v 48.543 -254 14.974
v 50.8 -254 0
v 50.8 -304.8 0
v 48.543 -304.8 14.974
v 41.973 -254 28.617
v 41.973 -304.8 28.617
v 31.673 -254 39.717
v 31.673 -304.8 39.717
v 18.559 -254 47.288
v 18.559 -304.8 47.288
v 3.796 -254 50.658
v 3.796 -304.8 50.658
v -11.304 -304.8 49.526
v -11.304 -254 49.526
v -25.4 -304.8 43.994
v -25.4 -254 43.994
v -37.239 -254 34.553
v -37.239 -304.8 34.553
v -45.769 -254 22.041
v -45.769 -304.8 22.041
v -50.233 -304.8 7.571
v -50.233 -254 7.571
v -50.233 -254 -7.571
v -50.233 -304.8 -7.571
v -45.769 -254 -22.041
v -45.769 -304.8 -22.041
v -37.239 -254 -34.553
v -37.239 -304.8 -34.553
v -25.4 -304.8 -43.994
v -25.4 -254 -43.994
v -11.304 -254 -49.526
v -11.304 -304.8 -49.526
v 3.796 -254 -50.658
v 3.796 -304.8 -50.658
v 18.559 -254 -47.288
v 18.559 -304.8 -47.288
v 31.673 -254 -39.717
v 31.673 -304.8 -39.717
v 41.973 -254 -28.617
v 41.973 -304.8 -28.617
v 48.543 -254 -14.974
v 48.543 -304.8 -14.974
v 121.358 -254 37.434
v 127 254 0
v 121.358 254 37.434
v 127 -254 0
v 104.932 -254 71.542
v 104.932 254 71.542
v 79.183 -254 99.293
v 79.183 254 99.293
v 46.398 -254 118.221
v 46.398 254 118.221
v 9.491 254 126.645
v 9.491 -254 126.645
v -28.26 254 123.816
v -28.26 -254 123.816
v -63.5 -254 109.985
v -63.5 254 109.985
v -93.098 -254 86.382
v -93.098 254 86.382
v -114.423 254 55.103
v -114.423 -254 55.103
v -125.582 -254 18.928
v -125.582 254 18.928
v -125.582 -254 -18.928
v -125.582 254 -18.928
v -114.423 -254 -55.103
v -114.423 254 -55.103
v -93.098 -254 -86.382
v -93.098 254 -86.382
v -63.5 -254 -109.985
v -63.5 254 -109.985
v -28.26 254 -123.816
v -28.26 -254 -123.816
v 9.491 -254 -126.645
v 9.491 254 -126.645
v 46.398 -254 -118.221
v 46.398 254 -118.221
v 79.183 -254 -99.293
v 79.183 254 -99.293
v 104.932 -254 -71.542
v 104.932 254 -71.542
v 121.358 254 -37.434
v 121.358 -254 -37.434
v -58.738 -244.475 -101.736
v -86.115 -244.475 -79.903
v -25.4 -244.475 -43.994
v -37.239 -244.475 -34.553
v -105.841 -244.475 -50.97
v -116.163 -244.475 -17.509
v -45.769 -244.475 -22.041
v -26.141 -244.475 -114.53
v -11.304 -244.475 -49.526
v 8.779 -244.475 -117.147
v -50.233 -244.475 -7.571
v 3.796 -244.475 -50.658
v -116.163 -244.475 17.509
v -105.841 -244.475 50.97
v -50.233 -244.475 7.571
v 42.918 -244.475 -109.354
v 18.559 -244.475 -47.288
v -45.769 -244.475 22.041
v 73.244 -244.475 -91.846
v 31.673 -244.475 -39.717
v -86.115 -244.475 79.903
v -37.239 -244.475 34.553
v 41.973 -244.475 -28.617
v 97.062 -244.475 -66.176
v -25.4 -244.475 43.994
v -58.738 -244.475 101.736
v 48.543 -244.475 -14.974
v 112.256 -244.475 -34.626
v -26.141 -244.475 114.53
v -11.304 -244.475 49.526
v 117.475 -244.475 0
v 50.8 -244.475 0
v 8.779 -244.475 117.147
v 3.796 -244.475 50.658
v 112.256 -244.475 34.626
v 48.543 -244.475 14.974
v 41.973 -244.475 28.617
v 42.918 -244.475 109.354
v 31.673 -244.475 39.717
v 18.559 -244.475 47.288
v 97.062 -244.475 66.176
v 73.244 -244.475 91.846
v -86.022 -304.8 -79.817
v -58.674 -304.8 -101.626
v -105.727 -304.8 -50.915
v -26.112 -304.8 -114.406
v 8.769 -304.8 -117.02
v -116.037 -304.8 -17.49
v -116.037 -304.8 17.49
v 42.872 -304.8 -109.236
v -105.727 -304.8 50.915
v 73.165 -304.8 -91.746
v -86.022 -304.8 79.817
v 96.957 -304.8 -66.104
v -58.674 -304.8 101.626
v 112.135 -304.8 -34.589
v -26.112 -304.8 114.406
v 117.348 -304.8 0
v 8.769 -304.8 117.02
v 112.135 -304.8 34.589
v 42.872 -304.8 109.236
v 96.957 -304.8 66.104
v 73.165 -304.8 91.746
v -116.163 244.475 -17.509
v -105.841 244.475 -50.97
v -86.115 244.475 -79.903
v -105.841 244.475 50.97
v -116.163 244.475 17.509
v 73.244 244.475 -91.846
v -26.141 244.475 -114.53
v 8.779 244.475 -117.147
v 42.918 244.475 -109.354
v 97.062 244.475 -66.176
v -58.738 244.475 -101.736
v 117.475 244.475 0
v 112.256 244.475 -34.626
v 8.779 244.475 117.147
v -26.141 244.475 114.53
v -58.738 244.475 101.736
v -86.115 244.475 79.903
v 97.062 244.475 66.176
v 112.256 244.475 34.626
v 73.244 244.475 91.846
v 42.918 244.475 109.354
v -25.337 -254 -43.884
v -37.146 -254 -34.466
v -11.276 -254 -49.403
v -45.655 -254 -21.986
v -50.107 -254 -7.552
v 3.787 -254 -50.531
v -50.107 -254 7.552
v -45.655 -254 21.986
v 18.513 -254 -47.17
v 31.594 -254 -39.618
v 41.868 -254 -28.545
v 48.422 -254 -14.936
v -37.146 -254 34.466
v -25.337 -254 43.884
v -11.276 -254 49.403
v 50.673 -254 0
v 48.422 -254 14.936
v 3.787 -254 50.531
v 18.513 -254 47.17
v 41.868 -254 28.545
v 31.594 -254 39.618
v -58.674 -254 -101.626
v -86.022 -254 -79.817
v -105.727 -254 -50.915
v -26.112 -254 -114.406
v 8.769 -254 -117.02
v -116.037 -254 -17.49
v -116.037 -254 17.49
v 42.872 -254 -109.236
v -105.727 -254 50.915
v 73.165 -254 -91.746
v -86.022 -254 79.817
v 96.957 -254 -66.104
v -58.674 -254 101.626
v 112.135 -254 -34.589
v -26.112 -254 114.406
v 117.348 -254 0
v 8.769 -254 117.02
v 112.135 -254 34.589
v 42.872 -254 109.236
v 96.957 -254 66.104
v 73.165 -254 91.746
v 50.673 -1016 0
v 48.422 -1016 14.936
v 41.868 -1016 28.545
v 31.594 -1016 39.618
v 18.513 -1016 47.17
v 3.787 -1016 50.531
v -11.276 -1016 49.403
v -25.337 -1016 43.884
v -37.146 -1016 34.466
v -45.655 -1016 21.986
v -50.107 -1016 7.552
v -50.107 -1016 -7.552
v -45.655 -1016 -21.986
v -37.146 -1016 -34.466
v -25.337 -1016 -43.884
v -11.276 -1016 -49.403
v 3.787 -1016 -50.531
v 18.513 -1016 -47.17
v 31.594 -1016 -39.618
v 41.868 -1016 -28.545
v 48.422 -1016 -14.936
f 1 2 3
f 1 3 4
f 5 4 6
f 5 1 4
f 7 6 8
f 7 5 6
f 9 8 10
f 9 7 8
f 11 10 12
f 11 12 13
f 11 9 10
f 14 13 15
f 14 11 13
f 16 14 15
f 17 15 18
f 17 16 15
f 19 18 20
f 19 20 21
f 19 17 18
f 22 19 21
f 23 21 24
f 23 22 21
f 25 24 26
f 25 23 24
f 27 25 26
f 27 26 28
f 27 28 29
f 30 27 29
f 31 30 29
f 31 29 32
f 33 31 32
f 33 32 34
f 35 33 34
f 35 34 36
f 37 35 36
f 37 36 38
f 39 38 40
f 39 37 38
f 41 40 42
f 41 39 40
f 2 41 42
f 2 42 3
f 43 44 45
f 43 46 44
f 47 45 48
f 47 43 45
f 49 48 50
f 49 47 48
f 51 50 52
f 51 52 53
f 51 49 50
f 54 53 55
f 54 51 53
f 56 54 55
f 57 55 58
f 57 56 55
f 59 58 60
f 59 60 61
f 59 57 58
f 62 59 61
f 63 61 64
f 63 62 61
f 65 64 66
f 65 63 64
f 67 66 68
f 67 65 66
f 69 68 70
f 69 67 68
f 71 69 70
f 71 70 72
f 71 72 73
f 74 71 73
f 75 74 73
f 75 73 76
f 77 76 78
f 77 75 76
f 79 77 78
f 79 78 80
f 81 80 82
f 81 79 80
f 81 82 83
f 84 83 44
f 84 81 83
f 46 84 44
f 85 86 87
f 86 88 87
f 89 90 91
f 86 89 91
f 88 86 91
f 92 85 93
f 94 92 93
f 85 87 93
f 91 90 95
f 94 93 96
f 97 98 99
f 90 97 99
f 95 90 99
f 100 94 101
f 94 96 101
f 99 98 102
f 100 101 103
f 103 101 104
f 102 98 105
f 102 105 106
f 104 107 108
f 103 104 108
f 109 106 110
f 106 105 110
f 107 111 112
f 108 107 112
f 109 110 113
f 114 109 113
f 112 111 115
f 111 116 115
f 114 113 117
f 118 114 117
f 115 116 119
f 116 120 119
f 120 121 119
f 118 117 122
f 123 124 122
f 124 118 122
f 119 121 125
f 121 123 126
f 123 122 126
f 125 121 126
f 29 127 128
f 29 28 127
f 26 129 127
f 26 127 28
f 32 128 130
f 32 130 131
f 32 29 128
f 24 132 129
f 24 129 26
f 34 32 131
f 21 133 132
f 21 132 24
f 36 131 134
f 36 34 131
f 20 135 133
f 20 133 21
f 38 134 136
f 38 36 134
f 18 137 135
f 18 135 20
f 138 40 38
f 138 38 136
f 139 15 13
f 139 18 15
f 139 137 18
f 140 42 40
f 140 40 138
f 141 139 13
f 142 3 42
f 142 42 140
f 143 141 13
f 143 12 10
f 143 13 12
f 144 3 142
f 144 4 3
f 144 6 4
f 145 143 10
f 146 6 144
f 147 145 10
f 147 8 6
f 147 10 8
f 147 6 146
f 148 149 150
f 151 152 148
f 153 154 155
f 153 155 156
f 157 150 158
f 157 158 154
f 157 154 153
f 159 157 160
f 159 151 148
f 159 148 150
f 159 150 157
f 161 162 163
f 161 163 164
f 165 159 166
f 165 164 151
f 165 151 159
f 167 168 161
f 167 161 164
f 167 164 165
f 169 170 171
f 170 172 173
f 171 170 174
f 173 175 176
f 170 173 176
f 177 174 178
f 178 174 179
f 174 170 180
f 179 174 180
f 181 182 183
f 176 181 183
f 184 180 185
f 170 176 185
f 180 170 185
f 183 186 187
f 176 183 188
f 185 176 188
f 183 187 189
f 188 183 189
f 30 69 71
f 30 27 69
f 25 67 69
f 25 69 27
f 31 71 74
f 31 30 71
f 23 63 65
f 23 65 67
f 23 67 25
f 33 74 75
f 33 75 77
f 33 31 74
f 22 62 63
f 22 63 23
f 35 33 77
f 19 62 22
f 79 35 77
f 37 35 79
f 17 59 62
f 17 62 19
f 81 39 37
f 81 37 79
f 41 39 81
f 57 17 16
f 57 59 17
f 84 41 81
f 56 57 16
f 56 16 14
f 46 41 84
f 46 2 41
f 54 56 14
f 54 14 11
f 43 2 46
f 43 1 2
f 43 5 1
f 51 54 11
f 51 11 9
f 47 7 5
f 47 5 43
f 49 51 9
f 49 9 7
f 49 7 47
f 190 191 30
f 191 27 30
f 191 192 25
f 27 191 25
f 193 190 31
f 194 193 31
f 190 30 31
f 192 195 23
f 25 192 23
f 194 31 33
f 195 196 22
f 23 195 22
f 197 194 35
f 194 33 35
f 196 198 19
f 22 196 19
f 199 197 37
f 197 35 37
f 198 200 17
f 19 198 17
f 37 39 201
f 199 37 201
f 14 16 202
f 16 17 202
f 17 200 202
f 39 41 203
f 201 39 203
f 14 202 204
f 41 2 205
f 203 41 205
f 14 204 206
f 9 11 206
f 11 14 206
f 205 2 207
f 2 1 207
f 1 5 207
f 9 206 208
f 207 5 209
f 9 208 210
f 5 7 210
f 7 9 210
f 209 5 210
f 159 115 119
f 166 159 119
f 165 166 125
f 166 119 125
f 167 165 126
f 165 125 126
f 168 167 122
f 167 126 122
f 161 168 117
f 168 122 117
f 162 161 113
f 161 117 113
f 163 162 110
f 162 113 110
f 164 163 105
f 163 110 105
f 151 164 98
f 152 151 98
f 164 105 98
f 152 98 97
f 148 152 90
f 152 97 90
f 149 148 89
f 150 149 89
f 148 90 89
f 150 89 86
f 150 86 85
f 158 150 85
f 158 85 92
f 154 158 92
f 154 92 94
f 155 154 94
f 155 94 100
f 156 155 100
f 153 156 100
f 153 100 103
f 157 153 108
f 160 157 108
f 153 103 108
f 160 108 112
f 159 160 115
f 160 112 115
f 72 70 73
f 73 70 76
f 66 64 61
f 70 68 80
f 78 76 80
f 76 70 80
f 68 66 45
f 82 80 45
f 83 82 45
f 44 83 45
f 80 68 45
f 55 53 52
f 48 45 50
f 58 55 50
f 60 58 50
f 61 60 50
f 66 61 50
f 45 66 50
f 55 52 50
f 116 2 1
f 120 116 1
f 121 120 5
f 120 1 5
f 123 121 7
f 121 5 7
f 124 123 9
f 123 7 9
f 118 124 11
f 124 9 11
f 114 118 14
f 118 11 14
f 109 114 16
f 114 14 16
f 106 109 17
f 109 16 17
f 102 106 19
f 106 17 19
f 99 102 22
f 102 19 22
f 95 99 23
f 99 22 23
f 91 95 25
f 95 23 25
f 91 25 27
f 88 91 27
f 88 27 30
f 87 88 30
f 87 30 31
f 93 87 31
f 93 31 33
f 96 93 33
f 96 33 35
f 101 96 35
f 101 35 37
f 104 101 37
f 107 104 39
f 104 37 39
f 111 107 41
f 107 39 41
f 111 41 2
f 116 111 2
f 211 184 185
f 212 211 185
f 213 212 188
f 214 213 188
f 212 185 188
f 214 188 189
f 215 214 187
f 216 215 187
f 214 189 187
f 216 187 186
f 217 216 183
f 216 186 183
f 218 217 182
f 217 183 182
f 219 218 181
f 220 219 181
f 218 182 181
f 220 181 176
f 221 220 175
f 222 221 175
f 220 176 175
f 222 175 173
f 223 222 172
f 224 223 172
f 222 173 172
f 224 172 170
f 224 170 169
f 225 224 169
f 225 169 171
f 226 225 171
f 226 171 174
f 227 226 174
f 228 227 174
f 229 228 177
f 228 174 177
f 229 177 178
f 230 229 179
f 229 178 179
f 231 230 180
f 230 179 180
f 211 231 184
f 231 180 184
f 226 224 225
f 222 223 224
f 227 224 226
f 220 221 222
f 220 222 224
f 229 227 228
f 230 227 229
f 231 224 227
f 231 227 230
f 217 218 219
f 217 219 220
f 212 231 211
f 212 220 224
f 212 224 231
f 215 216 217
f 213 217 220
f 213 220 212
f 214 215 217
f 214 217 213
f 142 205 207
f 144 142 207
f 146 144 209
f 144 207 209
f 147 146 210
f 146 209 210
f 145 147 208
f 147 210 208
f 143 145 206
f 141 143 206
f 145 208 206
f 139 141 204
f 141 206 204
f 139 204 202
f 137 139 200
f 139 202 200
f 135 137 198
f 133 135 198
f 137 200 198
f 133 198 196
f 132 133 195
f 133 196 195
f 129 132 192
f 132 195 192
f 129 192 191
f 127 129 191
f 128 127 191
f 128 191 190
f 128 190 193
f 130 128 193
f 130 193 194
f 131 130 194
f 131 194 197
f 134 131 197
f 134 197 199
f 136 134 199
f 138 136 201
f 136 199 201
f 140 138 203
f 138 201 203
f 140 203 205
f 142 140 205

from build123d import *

# Parameters (mm, degrees)
F0_R     = 127
F1_DEPTH = 254
F2_T     = -9.525
F3_R     = 50.8
F4_DEPTH = 9.525
F5_R     = 50.673
F6_DEPTH = 762
F7_R     = 117.348
F7_R_2   = 50.8
F8_DEPTH = 50.8


with BuildPart() as f1:
    # F0 (on Front) → F1 (new body, symmetric)
    with BuildSketch(Plane.XZ):
        Circle(F0_R)
    extrude(amount=F1_DEPTH, both=True)

    # F2 (hollow: no face is removed)
    offset(amount=F2_T, mode=Mode.SUBTRACT)

    # F3 (on face) → F4 (cut, through all)
    with BuildSketch(Plane.XZ.offset(254)):
        Circle(F3_R)
    extrude(amount=-F4_DEPTH, mode=Mode.SUBTRACT)


with BuildPart() as f6:
    # F5 (on face) → F6 (new body)
    with BuildSketch(Plane.XZ.offset(254)):
        Circle(F5_R)
    extrude(amount=F6_DEPTH)


with BuildPart() as f8:
    # F7 (on face) → F8 (new body)
    with BuildSketch(Plane.XZ.offset(254)):
        Circle(F7_R)
        Circle(F7_R_2, mode=Mode.SUBTRACT)
    extrude(amount=F8_DEPTH)


solid = Compound([f1.part, f6.part, f8.part])
